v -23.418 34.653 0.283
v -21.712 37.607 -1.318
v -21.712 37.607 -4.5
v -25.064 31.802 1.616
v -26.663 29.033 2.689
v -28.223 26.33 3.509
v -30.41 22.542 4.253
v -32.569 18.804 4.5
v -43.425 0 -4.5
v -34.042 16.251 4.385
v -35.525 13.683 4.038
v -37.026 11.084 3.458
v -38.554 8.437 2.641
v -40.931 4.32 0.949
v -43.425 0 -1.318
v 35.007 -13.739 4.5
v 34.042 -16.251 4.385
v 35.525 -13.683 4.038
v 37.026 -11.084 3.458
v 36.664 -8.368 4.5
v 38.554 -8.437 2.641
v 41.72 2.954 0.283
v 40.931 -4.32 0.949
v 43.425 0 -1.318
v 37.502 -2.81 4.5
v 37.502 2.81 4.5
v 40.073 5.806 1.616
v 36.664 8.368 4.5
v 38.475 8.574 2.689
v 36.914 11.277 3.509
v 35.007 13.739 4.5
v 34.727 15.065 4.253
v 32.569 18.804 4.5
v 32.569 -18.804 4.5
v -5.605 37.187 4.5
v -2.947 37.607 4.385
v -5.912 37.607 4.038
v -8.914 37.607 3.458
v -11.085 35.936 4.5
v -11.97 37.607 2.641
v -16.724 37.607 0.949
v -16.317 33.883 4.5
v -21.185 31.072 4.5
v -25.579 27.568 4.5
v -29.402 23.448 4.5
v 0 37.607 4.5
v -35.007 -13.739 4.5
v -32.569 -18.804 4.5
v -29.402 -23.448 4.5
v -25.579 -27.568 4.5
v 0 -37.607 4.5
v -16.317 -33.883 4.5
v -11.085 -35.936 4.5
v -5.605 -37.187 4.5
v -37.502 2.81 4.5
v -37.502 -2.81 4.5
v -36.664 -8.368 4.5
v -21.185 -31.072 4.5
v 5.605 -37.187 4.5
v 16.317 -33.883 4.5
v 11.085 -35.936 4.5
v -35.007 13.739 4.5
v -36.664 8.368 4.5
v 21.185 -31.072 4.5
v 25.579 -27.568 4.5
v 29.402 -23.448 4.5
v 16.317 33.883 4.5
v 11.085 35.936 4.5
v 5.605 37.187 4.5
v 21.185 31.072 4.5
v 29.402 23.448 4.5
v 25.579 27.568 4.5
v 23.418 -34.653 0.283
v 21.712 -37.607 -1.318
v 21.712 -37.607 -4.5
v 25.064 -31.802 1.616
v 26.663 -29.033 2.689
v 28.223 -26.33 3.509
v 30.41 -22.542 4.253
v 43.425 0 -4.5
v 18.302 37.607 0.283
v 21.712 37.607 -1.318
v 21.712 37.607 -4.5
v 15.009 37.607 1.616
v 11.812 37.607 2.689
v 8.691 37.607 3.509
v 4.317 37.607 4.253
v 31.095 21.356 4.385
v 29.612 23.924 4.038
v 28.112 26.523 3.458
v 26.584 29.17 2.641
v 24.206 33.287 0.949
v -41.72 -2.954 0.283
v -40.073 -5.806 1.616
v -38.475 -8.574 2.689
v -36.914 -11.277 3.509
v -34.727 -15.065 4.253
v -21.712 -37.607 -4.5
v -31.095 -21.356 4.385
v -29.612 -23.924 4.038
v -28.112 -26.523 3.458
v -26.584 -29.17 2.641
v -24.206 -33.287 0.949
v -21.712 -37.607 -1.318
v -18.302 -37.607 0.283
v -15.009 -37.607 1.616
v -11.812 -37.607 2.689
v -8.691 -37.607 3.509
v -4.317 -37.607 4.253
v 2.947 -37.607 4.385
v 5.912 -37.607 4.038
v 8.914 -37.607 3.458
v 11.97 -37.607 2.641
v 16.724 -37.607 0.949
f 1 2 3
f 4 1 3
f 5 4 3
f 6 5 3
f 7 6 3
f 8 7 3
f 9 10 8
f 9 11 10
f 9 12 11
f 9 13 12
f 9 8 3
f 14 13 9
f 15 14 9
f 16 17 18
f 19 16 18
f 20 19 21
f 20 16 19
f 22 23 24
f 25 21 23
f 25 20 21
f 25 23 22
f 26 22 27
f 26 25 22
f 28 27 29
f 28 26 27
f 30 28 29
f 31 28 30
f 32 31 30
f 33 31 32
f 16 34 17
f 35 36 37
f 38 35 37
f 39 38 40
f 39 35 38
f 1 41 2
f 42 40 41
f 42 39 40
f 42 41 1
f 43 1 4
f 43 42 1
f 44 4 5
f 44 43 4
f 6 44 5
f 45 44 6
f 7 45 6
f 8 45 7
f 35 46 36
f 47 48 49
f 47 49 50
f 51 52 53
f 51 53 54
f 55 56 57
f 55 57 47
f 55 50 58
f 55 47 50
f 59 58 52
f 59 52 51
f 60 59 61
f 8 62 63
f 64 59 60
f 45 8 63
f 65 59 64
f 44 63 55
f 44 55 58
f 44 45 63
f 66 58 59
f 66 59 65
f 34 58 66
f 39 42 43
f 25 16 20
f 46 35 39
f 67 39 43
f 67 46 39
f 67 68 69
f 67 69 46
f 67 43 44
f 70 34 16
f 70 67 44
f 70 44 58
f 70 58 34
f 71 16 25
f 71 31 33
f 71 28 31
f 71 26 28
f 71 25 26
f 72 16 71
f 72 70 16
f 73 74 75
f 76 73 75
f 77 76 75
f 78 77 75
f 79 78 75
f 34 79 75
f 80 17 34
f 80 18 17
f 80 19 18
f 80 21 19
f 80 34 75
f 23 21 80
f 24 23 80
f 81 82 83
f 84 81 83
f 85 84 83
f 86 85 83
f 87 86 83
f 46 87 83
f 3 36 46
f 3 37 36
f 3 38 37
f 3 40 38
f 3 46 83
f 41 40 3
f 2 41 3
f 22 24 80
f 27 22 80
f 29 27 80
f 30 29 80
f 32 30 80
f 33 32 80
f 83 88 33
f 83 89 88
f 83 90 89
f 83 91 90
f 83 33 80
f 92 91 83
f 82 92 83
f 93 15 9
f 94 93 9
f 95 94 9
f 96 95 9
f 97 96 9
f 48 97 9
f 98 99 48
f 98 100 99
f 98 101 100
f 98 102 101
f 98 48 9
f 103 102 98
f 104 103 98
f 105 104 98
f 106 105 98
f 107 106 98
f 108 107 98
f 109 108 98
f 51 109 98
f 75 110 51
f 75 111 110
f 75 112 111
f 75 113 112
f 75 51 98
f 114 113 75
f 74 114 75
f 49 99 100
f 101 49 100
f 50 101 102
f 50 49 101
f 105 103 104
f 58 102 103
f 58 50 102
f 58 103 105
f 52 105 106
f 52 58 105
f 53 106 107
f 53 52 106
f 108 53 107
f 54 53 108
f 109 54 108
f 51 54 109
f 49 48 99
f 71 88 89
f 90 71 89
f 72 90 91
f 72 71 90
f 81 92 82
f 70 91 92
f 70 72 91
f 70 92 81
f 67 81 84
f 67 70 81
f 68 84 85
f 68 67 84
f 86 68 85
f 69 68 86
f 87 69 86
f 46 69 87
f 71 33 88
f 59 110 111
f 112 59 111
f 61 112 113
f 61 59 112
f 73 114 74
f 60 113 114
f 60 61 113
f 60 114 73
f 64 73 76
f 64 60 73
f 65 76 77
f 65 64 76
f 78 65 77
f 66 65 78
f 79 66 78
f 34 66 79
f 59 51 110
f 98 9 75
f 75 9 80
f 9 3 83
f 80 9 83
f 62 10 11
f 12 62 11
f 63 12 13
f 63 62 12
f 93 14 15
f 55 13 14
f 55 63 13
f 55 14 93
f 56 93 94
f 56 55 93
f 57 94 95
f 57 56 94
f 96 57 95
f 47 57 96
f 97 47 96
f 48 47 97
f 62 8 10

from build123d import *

# Parameters (mm, degrees)
BOSS_EXTRUDE1_DEPTH = 4.5
SKETCH2_OUTSIDE_W   = 230.192
SKETCH2_OUTSIDE_H   = 218.556
SKETCH2_OUTSIDE_R   = 37.607090764
CUT_EXTRUDE1_DEPTH  = 59.146518755
CUT_EXTRUDE1_DRAFT  = -45


with BuildPart() as part:
    # Sketch1 → Boss-Extrude1 (new, symmetric)
    with BuildSketch(Plane.XY):
        Polygon((21.712463976, -37.607090764), (43.424927952, 0), (21.712463976, 37.607090764), (-21.712463976, 37.607090764), (-43.424927952, 0), (-21.712463976, -37.607090764), align=None)
    extrude(amount=BOSS_EXTRUDE1_DEPTH, both=True)


with BuildPart() as cut_extrude1_tool:
    # Sketch2 outside → Cut-Extrude1 (with draft: the straight prism first)
    with BuildSketch(Plane.XY.offset(4.5)):
        Rectangle(SKETCH2_OUTSIDE_W, SKETCH2_OUTSIDE_H)
        Circle(SKETCH2_OUTSIDE_R, mode=Mode.SUBTRACT)
    extrude(amount=-CUT_EXTRUDE1_DEPTH)
    # Cut-Extrude1: the draft: its side faces are tilted about the plane it starts from
    cut_extrude1_sides = [cut_extrude1_tool.faces().sort_by_distance(p)[0] for p in [
        (0, -109.278, -25.073259378),
        (115.096, 0, -25.073259378),
        (0, 109.278, -25.073259378),
        (-115.096, 0, -25.073259378),
        (-37.607090764, 0, -25.073259378),
    ]]
    draft(cut_extrude1_sides, Plane.XY.offset(4.5), CUT_EXTRUDE1_DRAFT)


with BuildPart() as part_1:
    add(part.part)

    # Cut-Extrude1: cut by cut_extrude1_tool
    add(cut_extrude1_tool.part, mode=Mode.SUBTRACT)


solid = part_1.part
